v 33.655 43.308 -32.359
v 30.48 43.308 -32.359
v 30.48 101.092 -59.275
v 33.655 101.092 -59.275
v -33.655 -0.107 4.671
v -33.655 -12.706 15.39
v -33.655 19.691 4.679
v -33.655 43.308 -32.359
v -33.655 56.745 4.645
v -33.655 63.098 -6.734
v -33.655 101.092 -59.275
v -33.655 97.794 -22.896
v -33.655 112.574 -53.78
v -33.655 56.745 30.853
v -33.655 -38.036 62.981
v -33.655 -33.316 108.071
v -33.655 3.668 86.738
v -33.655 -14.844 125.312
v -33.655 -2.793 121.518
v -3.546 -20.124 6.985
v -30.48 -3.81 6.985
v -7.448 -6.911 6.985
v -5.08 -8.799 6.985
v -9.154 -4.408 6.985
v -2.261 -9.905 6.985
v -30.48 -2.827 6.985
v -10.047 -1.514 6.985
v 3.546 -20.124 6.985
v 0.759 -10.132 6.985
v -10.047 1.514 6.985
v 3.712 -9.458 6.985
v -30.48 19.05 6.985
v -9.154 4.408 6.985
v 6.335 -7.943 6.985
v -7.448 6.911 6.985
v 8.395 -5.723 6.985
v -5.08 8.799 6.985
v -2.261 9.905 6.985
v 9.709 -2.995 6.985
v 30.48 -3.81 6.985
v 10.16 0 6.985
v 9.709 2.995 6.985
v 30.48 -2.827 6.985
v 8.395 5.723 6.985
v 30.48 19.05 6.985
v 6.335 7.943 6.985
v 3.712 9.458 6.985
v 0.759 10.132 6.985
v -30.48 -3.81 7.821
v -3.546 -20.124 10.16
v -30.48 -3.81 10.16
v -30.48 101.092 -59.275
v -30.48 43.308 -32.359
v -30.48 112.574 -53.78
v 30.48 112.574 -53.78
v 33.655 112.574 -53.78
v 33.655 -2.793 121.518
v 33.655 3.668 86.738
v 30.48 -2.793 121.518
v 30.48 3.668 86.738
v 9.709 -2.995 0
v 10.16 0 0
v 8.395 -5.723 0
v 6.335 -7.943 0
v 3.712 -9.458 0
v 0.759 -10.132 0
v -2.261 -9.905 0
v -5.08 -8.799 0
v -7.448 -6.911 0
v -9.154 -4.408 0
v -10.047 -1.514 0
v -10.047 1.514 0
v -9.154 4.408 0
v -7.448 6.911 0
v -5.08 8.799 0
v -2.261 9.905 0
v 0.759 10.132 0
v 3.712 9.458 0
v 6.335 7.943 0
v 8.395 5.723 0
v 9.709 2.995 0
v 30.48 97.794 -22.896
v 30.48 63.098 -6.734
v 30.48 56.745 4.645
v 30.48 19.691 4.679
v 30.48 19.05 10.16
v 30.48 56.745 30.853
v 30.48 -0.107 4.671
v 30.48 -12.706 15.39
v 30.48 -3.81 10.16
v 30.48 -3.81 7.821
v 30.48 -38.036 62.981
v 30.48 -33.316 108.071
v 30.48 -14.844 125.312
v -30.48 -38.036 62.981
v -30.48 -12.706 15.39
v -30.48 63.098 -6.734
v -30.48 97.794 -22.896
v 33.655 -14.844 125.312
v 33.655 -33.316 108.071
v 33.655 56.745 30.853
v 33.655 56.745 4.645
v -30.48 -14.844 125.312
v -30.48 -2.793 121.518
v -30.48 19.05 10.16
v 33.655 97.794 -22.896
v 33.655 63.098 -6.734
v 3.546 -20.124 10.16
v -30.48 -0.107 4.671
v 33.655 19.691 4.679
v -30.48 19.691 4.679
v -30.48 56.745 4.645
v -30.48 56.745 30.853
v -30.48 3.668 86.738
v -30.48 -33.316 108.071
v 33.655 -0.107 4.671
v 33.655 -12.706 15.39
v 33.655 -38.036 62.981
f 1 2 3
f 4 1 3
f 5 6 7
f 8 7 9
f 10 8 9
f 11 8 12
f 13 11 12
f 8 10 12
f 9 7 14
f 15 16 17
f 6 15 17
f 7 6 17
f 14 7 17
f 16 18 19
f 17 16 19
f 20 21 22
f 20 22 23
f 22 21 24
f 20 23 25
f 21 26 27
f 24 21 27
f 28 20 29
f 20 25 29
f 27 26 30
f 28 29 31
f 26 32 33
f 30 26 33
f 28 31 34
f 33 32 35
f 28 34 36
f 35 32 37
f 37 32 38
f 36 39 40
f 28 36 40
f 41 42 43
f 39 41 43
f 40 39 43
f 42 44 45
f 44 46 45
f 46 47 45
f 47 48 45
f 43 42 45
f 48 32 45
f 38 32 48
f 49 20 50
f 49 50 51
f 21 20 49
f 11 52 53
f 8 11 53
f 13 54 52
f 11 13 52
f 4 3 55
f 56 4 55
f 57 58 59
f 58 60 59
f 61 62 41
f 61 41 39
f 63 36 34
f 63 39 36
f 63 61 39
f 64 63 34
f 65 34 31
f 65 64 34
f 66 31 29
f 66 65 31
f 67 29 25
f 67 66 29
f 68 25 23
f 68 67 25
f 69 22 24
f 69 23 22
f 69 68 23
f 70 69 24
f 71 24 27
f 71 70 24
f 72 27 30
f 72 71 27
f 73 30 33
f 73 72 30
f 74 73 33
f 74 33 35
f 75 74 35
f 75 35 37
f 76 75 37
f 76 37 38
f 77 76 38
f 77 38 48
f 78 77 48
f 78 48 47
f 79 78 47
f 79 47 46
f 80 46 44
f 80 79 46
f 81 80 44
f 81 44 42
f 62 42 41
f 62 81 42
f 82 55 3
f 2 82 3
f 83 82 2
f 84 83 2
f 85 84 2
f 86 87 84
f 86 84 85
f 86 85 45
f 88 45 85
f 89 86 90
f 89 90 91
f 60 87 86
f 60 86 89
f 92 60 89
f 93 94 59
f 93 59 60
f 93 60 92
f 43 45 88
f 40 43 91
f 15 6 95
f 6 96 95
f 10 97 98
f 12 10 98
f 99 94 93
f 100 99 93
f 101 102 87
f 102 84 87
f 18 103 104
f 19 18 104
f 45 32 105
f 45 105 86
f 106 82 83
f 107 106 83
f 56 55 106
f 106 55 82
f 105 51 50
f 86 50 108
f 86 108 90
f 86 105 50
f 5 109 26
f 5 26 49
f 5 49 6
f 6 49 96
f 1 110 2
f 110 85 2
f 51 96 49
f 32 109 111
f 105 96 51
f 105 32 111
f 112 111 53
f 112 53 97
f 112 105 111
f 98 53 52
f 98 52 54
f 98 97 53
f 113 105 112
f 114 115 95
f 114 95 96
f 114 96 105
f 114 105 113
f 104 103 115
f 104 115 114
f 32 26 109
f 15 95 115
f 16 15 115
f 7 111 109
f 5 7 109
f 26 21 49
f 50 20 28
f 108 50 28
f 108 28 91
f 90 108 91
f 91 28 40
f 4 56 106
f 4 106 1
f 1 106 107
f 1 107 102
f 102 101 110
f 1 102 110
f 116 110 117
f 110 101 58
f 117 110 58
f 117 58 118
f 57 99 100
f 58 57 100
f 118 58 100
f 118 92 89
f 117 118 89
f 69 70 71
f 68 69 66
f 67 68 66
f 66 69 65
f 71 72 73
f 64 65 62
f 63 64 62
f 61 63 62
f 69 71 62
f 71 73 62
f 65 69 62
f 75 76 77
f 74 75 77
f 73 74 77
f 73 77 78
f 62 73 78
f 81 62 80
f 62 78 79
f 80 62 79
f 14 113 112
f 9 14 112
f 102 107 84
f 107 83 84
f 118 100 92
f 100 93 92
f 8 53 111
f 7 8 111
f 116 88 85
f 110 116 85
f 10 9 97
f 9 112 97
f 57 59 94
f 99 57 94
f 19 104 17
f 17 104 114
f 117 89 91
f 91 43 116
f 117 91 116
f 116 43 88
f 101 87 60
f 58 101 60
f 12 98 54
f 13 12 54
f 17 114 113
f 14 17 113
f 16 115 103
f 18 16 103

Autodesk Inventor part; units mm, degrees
sketch "Sketch1" plane through (0, 0, 0) normal (0, 0, 1) x (1, 0, 0)
  circle A0 centre (0, 0) radius 10.16
  arc A1 (-9.6844, 3.0721) -> (-9.6844, -3.0721) centre (0, 0) ccw construction
ref_plane "Work Plane1" through (-24.1297, -20.1241, 6.985) normal (0, 0, -1) x (0, 1, 0)
extrude "Extrusion1" add sketch "Sketch1" along normal up to surface (6.985 mm away)
sketch "Sketch2" plane through (0, 0, 6.985) normal (0, 0, 1) x (1, 0, 0)
  line L0 (-24.1297, 19.05) -> (24.1297, 19.05) construction
  line L1 (-30.4797, 4.9571) -> (-30.4797, 51.5313) construction
  line L2 (30.4797, 51.5313) -> (30.4797, 4.9571) construction
  line L3 (-3.5464, -20.1241) -> (3.5464, -20.1241)
  line L4 (3.5464, -20.1241) -> (30.4797, -3.81)
  line L5 (-3.5464, -20.1241) -> (-30.4797, -3.81)
  line L6 (-30.4797, -3.81) -> (-30.4797, 19.05)
  line L7 (-30.4797, 19.05) -> (30.4797, 19.05)
  line L8 (30.4797, 19.05) -> (30.4797, -3.81)
  line L9 (0, 141.501) -> (0, -68.047)
  arc A0 (-6.5797, -18.2867) -> (6.5797, -18.2867) centre (0, -7.4241) ccw construction
  line L10 (-6.5797, -18.2867) -> (-24.1297, -7.6563) construction
  line L11 (24.1297, -7.6563) -> (6.5797, -18.2867) construction
  point P0 (0, 0)
  point P1 (0, -20.1241)
ref_plane "Work Plane2" through (-24.1297, -20.1241, 10.16) normal (0, 0, 1) x (1, 0, 0)
extrude "Extrusion2" add sketch "Sketch2" along normal up to surface (3.175 mm away)
ref_plane "Work Plane3" through (-30.4797, 28.613, 25.8435) normal (1, 0, 0) x (0, 1, -0.0012)
sketch "Sketch3" plane through (-30.4797, 28.613, 25.8435) normal (1, 0, 0) x (0, 1, -0.0012)
  line L0 (-60.3032, 83.7671) -> (-46.2664, 96.8991) construction
  line L1 (-40.061, 98.3138) -> (-35.1427, 96.7719) construction
  line L2 (-30.8232, 91.9054) -> (-25.3621, 62.7037) construction
  line L3 (-66.4956, 38.9741) -> (-62.271, 79.8043) construction
  line L4 (-41.8663, -9.4545) -> (-65.7822, 35.3495) construction
  line L5 (-23.7279, 59.5092) -> (22.9055, 10.5268) construction
  line L6 (28.1348, -2.5269) -> (28.1554, -19.5123) construction
  line L7 (-12.3805, -21.1807) -> (-26.3576, -21.2033) construction
  line L8 (-30.4769, -19.6947) -> (-40.5808, -11.1193) construction
  line L9 (13.7735, -56.6336) -> (-7.0203, -24.1102) construction
  line L10 (69.8762, -83.775) -> (16.4352, -58.9603) construction
  line L11 (28.9647, -22.6068) -> (33.5205, -30.7438) construction
  line L12 (36.3869, -33.401) -> (67.1857, -47.7021) construction
  line L13 (70.2201, -50.6979) -> (81.3231, -73.8278) construction
  line L14 (78.362, -82.2562) -> (75.2702, -83.7404) construction
  line L15 (-62.0279, 82.1535) -> (-43.5762, 99.4159)
  line L16 (-43.5762, 99.4159) -> (-31.521, 95.6364)
  line L17 (-31.521, 95.6364) -> (-25.0181, 60.8644)
  line L18 (-25.0181, 60.8644) -> (28.1257, 5.0437)
  line L19 (28.1257, 5.0437) -> (28.1574, -21.1648)
  line L20 (28.1574, -21.1648) -> (34.5239, -32.536)
  line L21 (34.5239, -32.536) -> (69.2399, -48.656)
  line L22 (69.2399, -48.656) -> (84.0568, -79.5226)
  line L23 (84.0568, -79.5226) -> (72.5814, -85.0311)
  line L24 (72.5814, -85.0311) -> (14.7653, -58.1848)
  line L25 (14.7653, -58.1848) -> (-8.8968, -21.1751)
  line L26 (-8.8968, -21.1751) -> (-28.6949, -21.2071)
  line L27 (-28.6949, -21.2071) -> (-41.3065, -10.5034)
  line L28 (-41.3065, -10.5034) -> (-66.6939, 37.0577)
  line L29 (-66.6939, 37.0577) -> (-62.0279, 82.1535)
  point P0 (-28.5817, -25.8781)
ref_plane "Work Plane4" through (-33.6547, -38.1116, -58.8269) normal (-1, 0, 0) x (0, 0.0012, 1)
extrude "Extrusion3" add sketch "Sketch3" against normal up to surface (3.175 mm away)
mirror "Mirror1" about plane through (0, 0, 0) normal (1, 0, 0) of "Extrusion3"
properties part number "ShoulderCollision"
